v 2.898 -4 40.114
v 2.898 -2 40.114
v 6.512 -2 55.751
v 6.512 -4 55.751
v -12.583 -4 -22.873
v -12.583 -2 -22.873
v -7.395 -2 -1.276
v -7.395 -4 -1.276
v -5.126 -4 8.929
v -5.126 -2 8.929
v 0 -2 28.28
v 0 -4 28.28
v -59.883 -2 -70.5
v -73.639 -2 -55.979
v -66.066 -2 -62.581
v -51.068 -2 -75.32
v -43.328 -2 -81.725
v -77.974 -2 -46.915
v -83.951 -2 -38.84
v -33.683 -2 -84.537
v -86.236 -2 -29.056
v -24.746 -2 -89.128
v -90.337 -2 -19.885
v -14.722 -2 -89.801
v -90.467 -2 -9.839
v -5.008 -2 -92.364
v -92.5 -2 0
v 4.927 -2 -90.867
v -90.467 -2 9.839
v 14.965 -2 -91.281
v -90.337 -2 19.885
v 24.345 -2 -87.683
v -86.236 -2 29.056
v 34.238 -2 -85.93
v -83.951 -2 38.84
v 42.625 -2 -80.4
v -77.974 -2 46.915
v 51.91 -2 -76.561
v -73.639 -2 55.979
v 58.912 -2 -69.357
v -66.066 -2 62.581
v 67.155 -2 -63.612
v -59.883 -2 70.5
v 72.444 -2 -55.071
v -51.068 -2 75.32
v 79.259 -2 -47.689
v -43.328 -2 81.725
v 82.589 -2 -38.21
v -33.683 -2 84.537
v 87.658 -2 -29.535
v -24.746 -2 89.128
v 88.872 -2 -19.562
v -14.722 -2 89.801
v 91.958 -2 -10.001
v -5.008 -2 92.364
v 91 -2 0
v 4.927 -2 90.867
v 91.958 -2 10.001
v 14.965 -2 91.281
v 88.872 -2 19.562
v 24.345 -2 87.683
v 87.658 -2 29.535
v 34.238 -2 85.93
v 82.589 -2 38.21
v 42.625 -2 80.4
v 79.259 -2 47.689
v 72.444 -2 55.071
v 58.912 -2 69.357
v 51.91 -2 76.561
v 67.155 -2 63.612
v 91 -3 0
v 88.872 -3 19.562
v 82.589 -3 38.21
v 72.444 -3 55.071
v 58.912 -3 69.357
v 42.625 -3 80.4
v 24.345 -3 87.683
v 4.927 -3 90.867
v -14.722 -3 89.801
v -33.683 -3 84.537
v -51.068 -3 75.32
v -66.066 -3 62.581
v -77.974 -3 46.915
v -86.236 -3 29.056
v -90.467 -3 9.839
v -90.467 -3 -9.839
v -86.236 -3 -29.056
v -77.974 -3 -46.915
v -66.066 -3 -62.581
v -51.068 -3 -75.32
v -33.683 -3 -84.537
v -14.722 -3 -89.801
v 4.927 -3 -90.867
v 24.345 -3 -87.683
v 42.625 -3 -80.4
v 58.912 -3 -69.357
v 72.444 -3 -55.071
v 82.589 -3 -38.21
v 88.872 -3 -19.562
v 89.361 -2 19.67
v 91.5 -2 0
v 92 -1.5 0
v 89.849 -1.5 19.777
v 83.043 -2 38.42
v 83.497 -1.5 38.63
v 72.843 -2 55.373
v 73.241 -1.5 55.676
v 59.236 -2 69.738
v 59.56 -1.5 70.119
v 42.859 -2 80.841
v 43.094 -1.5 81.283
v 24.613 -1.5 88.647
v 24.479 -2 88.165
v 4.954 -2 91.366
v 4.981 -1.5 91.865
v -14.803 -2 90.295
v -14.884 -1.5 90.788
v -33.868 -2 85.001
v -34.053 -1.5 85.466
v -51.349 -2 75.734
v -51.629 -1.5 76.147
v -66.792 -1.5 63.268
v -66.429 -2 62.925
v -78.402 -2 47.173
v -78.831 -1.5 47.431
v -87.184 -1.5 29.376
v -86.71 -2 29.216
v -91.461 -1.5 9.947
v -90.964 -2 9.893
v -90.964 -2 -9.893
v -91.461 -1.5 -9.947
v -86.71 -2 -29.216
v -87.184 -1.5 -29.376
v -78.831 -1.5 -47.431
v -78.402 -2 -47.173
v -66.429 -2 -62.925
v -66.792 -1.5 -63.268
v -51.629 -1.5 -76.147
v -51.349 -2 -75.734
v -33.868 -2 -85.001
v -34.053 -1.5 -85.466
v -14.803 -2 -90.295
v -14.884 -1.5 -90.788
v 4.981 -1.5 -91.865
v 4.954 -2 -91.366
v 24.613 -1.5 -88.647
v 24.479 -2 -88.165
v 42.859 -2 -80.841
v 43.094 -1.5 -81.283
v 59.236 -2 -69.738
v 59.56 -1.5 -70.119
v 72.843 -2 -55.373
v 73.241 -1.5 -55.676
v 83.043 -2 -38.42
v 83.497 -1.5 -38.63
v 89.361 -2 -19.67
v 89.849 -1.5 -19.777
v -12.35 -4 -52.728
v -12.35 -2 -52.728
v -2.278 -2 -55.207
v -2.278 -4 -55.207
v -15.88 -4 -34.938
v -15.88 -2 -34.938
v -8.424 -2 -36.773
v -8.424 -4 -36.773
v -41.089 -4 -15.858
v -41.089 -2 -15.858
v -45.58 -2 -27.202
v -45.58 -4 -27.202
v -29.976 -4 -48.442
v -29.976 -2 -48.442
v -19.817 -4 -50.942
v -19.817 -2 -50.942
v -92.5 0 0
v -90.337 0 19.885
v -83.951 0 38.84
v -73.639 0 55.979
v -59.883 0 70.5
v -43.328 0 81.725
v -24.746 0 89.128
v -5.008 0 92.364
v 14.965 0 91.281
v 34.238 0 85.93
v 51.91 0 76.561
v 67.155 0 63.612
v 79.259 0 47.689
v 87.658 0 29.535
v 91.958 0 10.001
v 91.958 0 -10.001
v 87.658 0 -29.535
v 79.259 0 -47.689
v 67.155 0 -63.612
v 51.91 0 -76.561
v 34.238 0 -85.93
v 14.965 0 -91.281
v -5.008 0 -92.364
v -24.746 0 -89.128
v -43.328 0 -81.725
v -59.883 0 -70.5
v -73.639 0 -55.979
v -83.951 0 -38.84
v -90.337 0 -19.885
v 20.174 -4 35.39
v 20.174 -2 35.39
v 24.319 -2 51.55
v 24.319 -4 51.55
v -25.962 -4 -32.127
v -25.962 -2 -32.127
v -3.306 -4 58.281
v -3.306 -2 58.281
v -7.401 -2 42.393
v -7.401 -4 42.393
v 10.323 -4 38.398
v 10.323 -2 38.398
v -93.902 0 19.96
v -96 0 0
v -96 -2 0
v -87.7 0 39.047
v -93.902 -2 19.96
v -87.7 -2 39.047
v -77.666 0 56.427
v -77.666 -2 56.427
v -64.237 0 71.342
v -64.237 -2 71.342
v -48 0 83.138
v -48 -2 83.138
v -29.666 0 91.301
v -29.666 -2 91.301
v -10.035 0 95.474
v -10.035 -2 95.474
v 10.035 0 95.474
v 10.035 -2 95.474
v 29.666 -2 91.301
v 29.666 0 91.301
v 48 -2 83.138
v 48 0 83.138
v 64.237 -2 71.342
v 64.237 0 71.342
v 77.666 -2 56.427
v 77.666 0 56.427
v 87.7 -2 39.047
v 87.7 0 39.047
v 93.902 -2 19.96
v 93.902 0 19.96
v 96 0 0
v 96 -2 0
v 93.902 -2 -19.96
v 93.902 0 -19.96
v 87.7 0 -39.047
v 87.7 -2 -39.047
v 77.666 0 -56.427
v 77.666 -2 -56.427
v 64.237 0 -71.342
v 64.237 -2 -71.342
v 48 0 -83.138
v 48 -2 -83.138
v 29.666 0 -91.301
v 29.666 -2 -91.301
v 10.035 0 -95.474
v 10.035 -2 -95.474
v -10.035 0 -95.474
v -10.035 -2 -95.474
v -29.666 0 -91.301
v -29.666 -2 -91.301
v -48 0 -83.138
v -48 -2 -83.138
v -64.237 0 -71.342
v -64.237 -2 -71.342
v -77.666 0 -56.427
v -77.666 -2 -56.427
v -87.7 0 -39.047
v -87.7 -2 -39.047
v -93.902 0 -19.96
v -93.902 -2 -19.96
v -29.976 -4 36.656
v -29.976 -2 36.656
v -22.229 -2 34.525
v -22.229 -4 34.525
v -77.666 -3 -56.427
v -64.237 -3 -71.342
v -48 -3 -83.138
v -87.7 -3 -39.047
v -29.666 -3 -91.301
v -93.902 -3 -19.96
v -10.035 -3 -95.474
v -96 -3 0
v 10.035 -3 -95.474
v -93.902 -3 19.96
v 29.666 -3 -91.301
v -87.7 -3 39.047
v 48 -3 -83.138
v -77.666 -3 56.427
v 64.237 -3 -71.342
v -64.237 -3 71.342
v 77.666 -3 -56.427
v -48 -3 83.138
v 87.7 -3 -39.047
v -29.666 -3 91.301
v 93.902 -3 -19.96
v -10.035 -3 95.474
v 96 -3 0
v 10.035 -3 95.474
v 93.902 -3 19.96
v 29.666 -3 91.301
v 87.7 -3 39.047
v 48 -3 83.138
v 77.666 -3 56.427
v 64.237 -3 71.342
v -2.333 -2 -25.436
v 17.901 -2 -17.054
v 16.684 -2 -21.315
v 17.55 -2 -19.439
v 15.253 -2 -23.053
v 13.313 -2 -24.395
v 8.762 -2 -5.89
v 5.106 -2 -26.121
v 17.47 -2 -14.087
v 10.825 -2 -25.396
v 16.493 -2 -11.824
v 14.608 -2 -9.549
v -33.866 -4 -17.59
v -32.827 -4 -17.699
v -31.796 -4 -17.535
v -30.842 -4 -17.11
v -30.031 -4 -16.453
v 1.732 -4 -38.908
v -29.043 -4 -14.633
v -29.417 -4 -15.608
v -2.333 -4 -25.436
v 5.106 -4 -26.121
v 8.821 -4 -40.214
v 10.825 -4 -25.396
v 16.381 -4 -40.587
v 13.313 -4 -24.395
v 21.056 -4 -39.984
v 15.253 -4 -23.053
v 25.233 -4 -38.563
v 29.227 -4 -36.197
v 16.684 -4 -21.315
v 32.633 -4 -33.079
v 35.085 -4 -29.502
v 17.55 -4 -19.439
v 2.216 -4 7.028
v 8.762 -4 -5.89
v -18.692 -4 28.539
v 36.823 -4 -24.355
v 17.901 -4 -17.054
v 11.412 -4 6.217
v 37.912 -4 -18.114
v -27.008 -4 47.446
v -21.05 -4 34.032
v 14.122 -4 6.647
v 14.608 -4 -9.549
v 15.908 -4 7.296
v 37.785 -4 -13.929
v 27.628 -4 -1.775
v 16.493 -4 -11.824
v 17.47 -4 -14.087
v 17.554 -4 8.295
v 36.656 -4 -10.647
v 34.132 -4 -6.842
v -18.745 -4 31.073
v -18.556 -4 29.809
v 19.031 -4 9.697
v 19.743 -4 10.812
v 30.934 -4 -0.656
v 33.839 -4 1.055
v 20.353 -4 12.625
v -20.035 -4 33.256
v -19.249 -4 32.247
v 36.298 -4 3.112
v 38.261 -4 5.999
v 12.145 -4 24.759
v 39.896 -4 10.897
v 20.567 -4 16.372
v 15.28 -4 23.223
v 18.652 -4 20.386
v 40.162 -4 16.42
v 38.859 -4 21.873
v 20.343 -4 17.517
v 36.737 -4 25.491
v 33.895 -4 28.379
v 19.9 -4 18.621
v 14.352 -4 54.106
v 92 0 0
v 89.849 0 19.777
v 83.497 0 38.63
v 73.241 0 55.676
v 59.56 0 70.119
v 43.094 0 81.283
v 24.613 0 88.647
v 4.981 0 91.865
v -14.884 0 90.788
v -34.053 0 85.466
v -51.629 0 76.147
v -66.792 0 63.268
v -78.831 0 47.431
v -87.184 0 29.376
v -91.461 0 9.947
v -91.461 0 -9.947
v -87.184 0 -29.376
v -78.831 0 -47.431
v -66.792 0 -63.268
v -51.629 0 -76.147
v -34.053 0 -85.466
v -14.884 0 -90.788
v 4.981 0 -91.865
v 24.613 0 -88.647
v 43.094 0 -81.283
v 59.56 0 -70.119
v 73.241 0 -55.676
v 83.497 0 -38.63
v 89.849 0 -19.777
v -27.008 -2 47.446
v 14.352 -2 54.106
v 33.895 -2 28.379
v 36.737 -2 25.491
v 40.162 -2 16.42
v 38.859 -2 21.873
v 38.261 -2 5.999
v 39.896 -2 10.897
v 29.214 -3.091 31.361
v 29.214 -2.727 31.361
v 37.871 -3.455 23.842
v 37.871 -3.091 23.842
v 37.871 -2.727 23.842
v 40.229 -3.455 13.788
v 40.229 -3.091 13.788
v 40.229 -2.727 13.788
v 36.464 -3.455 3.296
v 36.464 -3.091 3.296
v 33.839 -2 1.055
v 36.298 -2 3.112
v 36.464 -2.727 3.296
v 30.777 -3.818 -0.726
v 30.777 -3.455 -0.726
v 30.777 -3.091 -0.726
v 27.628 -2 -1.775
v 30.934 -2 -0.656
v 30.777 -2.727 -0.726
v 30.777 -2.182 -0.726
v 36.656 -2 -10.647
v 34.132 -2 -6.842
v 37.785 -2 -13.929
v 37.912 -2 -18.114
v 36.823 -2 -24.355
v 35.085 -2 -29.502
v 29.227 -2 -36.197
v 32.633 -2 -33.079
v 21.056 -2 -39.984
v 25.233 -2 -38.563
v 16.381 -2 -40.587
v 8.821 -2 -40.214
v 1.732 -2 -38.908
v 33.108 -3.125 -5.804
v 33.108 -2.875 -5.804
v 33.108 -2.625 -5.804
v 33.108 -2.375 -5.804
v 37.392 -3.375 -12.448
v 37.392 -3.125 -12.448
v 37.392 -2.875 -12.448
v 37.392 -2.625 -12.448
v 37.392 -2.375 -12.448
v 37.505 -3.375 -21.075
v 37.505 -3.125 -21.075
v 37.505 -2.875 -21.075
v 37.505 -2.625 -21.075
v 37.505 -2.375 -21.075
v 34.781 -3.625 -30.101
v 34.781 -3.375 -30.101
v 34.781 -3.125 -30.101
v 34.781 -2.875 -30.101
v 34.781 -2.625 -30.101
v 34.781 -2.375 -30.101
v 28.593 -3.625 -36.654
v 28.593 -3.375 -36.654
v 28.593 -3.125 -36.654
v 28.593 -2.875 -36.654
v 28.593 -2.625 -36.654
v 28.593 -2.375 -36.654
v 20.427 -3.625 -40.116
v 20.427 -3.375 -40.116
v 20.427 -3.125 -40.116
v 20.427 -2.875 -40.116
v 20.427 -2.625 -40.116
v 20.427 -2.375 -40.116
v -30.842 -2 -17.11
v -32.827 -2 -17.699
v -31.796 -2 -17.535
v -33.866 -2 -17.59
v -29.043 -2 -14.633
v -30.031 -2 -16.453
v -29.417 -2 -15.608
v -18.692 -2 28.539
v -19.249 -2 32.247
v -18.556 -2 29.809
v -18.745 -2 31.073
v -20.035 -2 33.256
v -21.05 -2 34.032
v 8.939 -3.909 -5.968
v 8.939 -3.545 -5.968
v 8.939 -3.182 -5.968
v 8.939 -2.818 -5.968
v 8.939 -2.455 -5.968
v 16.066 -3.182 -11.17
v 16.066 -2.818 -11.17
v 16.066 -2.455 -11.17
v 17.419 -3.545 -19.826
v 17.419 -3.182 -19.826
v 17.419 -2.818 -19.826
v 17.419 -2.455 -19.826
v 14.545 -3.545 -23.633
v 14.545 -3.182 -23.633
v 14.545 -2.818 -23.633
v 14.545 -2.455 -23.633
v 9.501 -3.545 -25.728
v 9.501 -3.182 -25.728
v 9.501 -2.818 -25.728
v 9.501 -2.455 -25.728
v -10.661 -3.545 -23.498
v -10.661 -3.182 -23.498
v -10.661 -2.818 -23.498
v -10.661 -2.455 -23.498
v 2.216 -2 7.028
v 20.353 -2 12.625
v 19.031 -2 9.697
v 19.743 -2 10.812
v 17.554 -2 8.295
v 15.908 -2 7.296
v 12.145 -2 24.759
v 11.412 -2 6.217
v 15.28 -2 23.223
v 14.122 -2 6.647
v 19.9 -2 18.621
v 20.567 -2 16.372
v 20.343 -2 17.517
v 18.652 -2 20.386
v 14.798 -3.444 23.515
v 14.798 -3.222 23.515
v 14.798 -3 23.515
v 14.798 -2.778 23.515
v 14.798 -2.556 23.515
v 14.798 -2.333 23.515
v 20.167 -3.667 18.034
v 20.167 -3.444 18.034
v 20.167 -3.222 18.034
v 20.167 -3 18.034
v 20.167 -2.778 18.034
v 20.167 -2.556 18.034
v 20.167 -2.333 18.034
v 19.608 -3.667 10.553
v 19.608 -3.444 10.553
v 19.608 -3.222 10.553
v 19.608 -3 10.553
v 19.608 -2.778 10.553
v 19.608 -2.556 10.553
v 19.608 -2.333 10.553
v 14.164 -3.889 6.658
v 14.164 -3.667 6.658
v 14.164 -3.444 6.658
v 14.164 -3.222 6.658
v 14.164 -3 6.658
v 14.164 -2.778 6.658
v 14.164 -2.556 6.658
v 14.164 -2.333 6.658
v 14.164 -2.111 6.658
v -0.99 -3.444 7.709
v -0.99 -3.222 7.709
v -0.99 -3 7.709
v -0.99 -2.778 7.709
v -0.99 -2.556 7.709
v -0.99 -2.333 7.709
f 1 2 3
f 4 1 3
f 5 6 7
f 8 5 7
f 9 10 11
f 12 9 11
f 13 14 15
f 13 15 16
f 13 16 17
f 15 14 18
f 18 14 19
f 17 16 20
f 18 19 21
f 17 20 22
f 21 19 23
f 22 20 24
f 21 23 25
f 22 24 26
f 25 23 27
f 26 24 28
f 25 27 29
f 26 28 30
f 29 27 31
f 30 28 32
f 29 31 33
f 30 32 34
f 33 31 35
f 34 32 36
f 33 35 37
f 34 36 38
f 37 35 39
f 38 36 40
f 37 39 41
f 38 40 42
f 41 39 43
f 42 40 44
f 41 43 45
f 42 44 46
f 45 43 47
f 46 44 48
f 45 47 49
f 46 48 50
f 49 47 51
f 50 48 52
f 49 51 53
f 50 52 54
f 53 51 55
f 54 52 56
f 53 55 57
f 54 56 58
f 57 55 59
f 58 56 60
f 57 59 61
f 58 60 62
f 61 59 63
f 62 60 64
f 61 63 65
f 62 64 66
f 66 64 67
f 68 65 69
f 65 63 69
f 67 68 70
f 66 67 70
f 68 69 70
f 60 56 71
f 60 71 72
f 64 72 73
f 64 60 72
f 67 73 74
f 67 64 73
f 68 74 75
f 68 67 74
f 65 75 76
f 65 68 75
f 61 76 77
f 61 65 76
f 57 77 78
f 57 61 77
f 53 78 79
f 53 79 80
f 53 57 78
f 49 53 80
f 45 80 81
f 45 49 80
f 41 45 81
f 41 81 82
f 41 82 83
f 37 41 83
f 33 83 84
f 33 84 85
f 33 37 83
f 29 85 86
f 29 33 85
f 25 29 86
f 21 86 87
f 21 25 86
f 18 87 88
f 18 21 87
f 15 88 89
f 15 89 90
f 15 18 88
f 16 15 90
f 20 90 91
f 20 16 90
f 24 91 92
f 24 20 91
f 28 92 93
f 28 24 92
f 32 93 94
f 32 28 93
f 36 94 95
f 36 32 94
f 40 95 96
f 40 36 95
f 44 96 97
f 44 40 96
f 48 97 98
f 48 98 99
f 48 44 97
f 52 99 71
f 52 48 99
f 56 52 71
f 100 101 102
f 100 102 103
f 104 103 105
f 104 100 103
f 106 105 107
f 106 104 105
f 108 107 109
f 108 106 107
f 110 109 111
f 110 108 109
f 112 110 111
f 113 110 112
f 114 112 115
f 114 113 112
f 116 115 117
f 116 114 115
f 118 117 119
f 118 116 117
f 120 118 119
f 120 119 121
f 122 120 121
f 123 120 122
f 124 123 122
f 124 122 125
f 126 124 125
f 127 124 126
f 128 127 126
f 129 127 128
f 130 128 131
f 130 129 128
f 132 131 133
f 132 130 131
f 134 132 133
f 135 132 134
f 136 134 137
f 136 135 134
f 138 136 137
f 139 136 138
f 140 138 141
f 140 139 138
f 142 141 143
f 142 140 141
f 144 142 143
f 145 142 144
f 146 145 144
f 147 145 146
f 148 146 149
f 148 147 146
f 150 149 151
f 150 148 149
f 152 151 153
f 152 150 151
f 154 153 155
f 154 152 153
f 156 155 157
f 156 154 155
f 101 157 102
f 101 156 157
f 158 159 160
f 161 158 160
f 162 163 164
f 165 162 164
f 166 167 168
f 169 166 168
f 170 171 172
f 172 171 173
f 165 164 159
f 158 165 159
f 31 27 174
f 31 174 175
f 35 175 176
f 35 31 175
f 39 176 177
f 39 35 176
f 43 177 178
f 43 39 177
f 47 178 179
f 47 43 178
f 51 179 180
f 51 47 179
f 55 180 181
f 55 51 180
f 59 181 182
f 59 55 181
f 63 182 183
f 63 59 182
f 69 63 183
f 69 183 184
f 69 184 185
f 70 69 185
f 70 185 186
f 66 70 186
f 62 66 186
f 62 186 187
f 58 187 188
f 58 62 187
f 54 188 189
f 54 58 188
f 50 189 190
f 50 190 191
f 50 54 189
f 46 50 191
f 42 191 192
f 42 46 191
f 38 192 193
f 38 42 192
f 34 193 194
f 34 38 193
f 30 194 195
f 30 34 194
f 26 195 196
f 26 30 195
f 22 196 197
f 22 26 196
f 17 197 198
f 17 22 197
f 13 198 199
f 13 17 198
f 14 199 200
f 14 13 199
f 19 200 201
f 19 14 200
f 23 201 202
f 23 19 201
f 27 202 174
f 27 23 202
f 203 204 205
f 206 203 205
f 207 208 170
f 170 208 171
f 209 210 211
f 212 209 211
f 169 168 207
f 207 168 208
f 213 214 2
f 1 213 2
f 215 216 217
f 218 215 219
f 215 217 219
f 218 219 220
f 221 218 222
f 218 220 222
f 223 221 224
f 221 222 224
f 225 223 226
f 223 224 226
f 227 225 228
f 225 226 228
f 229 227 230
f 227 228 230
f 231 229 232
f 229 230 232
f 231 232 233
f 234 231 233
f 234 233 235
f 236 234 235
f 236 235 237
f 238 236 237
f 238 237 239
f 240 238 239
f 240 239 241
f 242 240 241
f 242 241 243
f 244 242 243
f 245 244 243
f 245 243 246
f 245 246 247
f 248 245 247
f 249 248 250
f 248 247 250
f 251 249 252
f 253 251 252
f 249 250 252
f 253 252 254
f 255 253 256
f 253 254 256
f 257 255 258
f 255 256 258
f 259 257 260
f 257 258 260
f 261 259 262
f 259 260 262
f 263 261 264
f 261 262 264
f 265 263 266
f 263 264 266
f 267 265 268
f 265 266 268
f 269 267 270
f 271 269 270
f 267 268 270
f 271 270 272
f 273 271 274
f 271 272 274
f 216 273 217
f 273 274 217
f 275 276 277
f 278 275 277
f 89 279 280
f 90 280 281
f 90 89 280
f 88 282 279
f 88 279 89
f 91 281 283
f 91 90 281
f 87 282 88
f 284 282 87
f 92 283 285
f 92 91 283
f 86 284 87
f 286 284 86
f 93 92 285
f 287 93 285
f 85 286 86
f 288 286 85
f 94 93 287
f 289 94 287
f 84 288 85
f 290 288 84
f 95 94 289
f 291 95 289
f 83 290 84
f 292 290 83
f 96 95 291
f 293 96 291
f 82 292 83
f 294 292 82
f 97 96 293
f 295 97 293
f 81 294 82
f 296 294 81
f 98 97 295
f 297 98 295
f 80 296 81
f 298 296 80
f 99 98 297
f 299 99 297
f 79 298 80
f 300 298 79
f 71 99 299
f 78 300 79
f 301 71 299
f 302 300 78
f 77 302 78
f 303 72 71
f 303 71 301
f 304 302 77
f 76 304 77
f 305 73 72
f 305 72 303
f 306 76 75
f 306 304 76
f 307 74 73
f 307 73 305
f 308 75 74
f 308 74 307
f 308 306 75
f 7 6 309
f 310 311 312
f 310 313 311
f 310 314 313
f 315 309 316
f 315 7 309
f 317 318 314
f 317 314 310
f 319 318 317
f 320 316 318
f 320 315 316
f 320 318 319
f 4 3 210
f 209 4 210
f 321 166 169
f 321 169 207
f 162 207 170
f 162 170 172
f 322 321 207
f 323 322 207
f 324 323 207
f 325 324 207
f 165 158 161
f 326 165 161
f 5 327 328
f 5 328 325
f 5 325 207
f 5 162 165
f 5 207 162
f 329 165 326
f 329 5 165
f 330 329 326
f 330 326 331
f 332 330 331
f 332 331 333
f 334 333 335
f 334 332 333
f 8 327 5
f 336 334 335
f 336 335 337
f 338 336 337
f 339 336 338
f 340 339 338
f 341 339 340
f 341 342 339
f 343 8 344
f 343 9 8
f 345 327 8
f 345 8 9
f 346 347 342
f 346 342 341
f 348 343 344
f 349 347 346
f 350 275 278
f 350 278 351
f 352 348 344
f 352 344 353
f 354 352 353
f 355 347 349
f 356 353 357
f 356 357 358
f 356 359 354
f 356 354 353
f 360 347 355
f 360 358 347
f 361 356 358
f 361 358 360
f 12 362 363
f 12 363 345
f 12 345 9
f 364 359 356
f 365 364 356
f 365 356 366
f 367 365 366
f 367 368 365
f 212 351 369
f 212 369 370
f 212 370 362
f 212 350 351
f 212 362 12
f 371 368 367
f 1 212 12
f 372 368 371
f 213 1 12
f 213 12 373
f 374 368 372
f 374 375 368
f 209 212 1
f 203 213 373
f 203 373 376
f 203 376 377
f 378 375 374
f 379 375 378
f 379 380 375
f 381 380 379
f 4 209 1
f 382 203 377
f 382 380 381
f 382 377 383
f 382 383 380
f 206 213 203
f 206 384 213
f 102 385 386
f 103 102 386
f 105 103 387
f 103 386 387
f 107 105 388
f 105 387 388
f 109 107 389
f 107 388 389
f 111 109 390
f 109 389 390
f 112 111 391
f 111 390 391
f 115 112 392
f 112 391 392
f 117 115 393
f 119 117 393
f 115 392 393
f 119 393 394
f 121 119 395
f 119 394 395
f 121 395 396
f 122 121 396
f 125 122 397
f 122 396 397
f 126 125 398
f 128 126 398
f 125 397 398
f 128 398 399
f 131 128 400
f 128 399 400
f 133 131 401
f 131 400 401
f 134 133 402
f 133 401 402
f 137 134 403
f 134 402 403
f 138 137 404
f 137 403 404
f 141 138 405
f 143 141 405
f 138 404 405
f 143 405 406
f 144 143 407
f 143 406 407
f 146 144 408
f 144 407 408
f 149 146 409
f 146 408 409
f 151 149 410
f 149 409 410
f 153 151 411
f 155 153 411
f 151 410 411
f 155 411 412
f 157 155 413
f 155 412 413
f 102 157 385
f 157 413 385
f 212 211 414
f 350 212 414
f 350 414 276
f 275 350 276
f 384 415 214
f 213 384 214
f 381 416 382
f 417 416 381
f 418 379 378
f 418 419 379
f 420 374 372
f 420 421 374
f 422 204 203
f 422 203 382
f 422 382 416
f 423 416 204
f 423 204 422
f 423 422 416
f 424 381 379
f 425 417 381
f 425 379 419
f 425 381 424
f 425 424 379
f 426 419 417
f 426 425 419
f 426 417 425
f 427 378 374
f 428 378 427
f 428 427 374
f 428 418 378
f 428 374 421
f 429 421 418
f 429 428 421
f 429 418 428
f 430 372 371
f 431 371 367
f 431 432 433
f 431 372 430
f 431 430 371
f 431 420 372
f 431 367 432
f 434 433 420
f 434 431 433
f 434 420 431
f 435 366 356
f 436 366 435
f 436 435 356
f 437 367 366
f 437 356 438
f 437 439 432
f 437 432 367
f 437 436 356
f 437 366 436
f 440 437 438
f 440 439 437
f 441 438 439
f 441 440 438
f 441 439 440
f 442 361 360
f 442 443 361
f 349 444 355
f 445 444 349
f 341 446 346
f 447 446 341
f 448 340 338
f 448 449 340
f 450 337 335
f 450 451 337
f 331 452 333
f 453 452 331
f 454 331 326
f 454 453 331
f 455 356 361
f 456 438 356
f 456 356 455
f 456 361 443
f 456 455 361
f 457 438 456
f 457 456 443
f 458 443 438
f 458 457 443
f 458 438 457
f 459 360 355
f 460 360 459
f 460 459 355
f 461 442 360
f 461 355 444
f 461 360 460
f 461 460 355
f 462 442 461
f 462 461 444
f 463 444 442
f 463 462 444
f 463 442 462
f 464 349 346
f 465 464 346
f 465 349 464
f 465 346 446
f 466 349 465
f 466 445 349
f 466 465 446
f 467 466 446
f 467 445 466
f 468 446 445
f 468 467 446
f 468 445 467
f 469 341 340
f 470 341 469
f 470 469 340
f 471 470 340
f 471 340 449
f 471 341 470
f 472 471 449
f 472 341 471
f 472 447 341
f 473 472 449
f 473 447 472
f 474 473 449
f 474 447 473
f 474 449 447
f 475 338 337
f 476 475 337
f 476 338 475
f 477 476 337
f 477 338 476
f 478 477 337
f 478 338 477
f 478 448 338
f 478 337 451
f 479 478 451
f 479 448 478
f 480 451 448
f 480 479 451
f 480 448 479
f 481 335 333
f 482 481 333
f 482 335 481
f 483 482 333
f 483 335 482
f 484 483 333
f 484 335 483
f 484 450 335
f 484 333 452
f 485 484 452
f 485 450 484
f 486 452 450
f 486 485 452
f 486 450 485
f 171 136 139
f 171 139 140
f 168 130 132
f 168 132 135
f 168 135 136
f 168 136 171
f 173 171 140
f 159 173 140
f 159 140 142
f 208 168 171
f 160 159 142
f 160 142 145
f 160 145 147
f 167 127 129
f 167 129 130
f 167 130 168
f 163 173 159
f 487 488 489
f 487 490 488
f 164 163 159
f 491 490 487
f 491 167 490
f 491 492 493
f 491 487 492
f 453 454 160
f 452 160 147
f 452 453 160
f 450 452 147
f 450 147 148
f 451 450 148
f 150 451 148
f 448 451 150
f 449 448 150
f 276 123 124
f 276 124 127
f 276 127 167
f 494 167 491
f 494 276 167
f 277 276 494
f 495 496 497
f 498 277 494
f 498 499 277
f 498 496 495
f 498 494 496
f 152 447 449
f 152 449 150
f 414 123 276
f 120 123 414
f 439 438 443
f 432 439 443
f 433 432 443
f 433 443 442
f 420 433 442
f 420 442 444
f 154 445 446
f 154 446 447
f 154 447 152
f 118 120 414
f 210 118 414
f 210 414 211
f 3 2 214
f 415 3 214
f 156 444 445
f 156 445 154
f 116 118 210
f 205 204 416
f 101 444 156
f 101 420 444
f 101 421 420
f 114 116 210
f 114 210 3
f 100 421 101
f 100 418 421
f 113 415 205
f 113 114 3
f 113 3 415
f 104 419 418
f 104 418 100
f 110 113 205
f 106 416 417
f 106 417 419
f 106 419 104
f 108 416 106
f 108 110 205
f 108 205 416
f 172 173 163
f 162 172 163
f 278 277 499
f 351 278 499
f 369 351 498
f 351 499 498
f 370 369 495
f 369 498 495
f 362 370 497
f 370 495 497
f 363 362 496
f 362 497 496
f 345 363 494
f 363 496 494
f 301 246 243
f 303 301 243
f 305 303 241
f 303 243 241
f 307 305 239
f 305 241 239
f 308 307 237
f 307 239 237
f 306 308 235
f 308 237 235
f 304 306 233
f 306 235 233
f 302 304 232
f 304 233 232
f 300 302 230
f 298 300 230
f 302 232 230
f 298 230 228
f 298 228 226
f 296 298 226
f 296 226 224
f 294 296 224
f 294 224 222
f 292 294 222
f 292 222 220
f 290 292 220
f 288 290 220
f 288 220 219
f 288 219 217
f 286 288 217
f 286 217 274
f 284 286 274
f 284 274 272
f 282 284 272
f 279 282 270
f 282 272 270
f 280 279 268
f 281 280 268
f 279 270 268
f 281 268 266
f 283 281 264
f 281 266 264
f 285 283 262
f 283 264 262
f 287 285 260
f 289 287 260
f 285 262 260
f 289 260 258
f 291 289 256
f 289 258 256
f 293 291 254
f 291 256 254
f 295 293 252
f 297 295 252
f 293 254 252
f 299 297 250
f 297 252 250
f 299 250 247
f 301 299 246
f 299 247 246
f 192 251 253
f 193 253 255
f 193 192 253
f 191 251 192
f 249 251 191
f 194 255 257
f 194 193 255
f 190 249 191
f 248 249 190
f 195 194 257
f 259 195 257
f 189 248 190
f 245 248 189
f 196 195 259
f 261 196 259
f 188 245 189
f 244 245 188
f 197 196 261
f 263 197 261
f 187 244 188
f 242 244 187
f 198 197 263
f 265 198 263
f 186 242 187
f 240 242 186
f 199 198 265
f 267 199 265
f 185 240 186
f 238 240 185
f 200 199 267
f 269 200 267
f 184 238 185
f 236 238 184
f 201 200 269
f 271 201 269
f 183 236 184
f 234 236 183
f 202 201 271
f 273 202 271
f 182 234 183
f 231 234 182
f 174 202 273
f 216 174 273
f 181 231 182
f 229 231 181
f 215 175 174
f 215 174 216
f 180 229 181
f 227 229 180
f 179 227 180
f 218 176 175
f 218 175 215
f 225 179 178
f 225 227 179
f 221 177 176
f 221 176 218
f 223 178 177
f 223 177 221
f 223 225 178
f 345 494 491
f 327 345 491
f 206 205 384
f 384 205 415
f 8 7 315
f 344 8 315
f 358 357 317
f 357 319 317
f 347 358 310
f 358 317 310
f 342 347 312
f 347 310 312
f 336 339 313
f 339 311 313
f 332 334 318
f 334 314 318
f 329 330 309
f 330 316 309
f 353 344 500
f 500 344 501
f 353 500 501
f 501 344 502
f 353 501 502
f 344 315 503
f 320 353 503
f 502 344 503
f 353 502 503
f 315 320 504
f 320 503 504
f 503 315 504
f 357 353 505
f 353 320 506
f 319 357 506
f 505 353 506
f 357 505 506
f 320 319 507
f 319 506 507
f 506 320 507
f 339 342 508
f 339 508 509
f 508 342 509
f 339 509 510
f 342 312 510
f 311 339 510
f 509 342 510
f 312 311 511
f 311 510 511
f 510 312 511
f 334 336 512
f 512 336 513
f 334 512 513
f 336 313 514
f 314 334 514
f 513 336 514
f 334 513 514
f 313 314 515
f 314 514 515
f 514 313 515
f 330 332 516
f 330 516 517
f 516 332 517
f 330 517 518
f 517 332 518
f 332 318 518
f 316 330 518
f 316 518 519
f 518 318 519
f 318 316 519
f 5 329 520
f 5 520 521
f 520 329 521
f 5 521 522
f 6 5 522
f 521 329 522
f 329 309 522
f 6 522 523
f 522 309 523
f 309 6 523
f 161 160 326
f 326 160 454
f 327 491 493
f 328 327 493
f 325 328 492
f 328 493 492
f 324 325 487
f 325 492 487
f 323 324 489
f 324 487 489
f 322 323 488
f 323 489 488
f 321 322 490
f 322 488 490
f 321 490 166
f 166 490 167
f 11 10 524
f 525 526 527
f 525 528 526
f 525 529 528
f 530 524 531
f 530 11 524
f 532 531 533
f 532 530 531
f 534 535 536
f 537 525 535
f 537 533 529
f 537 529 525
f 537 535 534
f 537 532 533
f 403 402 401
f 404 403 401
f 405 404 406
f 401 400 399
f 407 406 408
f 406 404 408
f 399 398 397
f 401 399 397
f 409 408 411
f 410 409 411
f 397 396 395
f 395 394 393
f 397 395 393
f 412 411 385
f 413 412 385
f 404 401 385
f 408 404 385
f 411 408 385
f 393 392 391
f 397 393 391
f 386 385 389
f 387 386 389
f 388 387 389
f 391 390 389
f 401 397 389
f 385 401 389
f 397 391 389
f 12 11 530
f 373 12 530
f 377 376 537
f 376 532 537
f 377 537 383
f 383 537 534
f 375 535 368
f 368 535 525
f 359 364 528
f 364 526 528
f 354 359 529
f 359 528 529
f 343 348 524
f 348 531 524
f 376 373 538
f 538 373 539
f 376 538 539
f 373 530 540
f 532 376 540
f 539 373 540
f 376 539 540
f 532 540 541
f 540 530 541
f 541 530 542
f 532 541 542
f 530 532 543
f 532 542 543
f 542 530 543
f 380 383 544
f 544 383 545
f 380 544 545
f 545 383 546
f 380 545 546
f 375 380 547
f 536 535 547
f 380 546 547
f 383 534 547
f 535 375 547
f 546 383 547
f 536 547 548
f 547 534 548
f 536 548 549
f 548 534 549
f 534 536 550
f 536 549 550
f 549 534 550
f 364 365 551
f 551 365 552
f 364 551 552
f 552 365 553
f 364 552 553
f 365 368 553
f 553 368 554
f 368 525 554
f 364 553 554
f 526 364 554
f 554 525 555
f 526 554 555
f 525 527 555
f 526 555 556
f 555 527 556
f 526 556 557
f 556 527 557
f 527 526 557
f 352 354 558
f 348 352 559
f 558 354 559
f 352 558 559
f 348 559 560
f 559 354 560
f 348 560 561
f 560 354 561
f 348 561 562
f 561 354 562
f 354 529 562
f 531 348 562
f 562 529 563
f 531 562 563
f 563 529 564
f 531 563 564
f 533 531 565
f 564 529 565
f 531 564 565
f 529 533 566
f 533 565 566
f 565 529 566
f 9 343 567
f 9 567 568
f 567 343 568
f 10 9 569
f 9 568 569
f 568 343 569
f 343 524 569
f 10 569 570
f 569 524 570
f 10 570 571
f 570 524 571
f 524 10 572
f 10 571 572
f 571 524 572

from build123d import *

# Parameters (mm, degrees)
F0_R     = 92
F1_DEPTH = 2
F3_DEPTH = 2
F4_SIZE  = 0.5
F5_R     = 96
F5_R_2   = 91
F6_DEPTH = 1
F7_R     = 96
F7_R_2   = 92.5
F8_DEPTH = 2


with BuildPart() as f1:
    # F0 (on Front) → F1 (new body)
    with BuildSketch(Plane.XZ):
        Circle(F0_R)
    extrude(amount=F1_DEPTH)

    # F2 (on face) → F3 (join)
    with BuildSketch(Plane.XZ.offset(2)):
        with BuildLine():
            Line((-27.0083267242, 47.4462620914), (-29.9760848284, 36.6564840078))
            Line((-29.9760848284, 36.6564840078), (-22.2285168536, 34.5254941518))
            ThreePointArc((-22.2285168536, 34.5254941518), (-19.2494475019, 32.2474077001), (-18.6923401828, 28.5387470903))
            Line((-18.6923401828, 28.5387470903), (-29.0434567348, -14.6331475965))
            ThreePointArc((-29.0434567348, -14.6331475965), (-30.842207656, -17.1104602787), (-33.8658412268, -17.5902759013))
            Line((-33.8658412268, -17.5902759013), (-41.0893774862, -15.8583235217))
            Line((-41.0893774862, -15.8583235217), (-45.5802306533, -27.2019170225))
            Line((-45.5802306533, -27.2019170225), (-25.9616385436, -32.1266614632))
            Line((-25.9616385436, -32.1266614632), (-29.9760848284, -48.441970569))
            Line((-29.9760848284, -48.441970569), (-19.817475765, -50.9415364766))
            Line((-19.817475765, -50.9415364766), (-15.8797713169, -34.9381176534))
            Line((-15.8797713169, -34.9381176534), (-8.4244611112, -36.7725261935))
            Line((-8.4244611112, -36.7725261935), (-12.3504317889, -52.7282572216))
            Line((-12.3504317889, -52.7282572216), (-2.2778489124, -55.2066560459))
            Line((-2.2778489124, -55.2066560459), (1.7324462003, -38.9082179233))
            add(Edge.make_bspline(
                [(27.6279114187, -1.7749243416), (28.7092025494, -2.4821118055), (30.7632053657, -3.8254734602), (33.1785734598, -5.7595776851), (35.5436051108, -8.3351168728), (37.6216996589, -12.4301034838), (38.2066856938, -16.2784704159), (37.5570764776, -21.1513349859), (36.6134428702, -25.4996695115), (35.0105992865, -30.2464913011), (32.2788072952, -33.64721937), (28.7034354961, -36.8048168389), (24.5561605745, -39.0157443509), (20.4502370232, -40.2644712402), (15.4624899933, -40.7624594383), (10.5521076326, -40.369441247), (6.0731193085, -39.9870515263), (3.1776998465, -39.2674221664), (1.7324462003, -38.9082179233)],
                knots=[0, 0, 0, 0, 0.0581811431, 0.1105199409, 0.166396485, 0.2299926025, 0.2891848852, 0.3549289053, 0.4189757736, 0.485313278, 0.5477155456, 0.6129869197, 0.6776623921, 0.7396069918, 0.8064894325, 0.8732457029, 0.9367303728, 1, 1, 1, 1], degree=3))
            add(Edge.make_bspline(
                [(20.1740991324, 35.3902466595), (21.6278121019, 34.6904285852), (24.3149738139, 33.6950984802), (29.3194313708, 31.4341194751), (34.3685495032, 28.396134608), (38.1341477981, 24.00928099), (39.9212139511, 19.2453405833), (40.5146903242, 13.7528029738), (39.3999313783, 7.8866877404), (36.7900227553, 3.1342771082), (33.4577982443, 0.7471944738), (30.842437236, -0.8483793153), (28.7242359185, -1.4589227998), (27.6279114187, -1.7749243416)],
                knots=[0, 0, 0, 0, 0.0879131849, 0.1842216609, 0.2852566372, 0.3837098851, 0.4762391657, 0.5729605468, 0.6742091416, 0.7698609916, 0.8525033329, 0.9244859802, 1, 1, 1, 1], degree=3))
            Line((20.1740991324, 35.3902466595), (24.3186354637, 51.5502765775))
            Line((24.3186354637, 51.5502765775), (14.3516925878, 54.1064820468))
            Line((14.3516925878, 54.1064820468), (10.3228697553, 38.3976325393))
            Line((10.3228697553, 38.3976325393), (2.8977939663, 40.1137321249))
            Line((2.8977939663, 40.1137321249), (6.511894986, 55.7509213686))
            Line((6.511894986, 55.7509213686), (-3.3063256055, 58.2813601075))
            Line((-3.3063256055, 58.2813601075), (-7.4012280942, 42.3929470361))
            Line((-7.4012280942, 42.3929470361), (-27.0083267242, 47.4462620914))
        make_face()
        with BuildLine():
            add(Edge.make_bspline(
                [(-7.3945214972, -1.2756045908), (-6.5768317056, -1.4028643234), (-4.63900586, -1.7427881734), (-2.57081296, -2.2995746446), (0.0421927128, -2.9636168954), (3.0184104723, -3.8011660264), (5.9488114617, -4.8226208543), (8.9704667551, -5.8952692635), (11.4440716652, -7.2485195874), (13.9774779434, -8.8724554322), (16.2131732777, -11.0678870183), (17.5644795402, -13.8713713722), (18.0569415504, -16.9841107708), (17.6084902929, -19.8814042944), (15.9556754656, -22.6059172587), (13.485660827, -24.5123892135), (9.5065873234, -25.9541132726), (4.911272628, -26.2048659523), (1.0813354306, -25.9598137418), (-2.7013841014, -25.417109761), (-5.5597148749, -24.7559847533), (-9.1231579206, -23.8913288849), (-10.6289368032, -23.5341618733), (-11.9050285979, -23.1026036338), (-12.5828394666, -22.8733764961)],
                knots=[0, 0, 0, 0, 0.0432107736, 0.0817951762, 0.1242054829, 0.1701874201, 0.2163611502, 0.2628601821, 0.3065968424, 0.3516498299, 0.3974950427, 0.44315253, 0.489019377, 0.5332628071, 0.5788489469, 0.6243879684, 0.6776568014, 0.7336079752, 0.7850652102, 0.8352687365, 0.881065134, 0.9301909347, 0.9629532558, 1, 1, 1, 1], degree=3))
            Line((-12.5828394666, -22.8733764961), (-7.3945214972, -1.2756045908))
        make_face(mode=Mode.SUBTRACT)
        with BuildLine():
            add(Edge.make_bspline(
                [(0, 28.2796639949), (0.6594507111, 28.1632733619), (2.0293480465, 27.8319072156), (4.4759400475, 27.312592786), (6.6129046687, 26.5807861519), (9.423953844, 25.9000782009), (12.1110497434, 24.7654919402), (14.8942249223, 23.6378539674), (18.1229068592, 21.1862173413), (20.5049371095, 18.1625957982), (20.7642688452, 14.5027255358), (20.0065708946, 10.3595714781), (17.154968946, 7.7981675266), (14.2040228218, 6.4857733605), (10.3534918094, 6.0512943472), (6.4301023642, 6.2721085581), (2.5706409463, 6.9434579896), (-0.9212078817, 7.6467920997), (-3.4708089675, 8.3887302885), (-4.6424710337, 8.6795403272), (-5.1260385662, 8.9294910431)],
                knots=[0, 0, 0, 0, 0.0451188564, 0.094356234, 0.1416763455, 0.194691, 0.2480920849, 0.3022750925, 0.3651943655, 0.4256230889, 0.4846354637, 0.547888998, 0.6075615518, 0.6634490372, 0.7245455133, 0.7868925643, 0.8491009373, 0.9085462245, 0.9592924665, 1, 1, 1, 1], degree=3))
            Line((-5.1260385662, 8.9294910431), (0, 28.2796639949))
        make_face(mode=Mode.SUBTRACT)
    extrude(amount=F3_DEPTH)

    # F4
    f4_edges = [f1.edges().sort_by_distance(p)[0] for p in [
        (-92, -2, 0),
    ]]
    chamfer(f4_edges, length=F4_SIZE)


with BuildPart() as f6:
    # F5 (on face) → F6 (new body)
    with BuildSketch(Plane.XZ.offset(2)):
        Circle(F5_R)
        Circle(F5_R_2, mode=Mode.SUBTRACT)
    extrude(amount=F6_DEPTH)

    # F7 (on face) → F8 (join)
    with BuildSketch(Plane(origin=(0, -2, 0), x_dir=(-1, 0, 0), z_dir=(0, 1, 0))):
        Circle(F7_R)
        Circle(F7_R_2, mode=Mode.SUBTRACT)
    extrude(amount=F8_DEPTH)


solid = Compound([f1.part, f6.part])
